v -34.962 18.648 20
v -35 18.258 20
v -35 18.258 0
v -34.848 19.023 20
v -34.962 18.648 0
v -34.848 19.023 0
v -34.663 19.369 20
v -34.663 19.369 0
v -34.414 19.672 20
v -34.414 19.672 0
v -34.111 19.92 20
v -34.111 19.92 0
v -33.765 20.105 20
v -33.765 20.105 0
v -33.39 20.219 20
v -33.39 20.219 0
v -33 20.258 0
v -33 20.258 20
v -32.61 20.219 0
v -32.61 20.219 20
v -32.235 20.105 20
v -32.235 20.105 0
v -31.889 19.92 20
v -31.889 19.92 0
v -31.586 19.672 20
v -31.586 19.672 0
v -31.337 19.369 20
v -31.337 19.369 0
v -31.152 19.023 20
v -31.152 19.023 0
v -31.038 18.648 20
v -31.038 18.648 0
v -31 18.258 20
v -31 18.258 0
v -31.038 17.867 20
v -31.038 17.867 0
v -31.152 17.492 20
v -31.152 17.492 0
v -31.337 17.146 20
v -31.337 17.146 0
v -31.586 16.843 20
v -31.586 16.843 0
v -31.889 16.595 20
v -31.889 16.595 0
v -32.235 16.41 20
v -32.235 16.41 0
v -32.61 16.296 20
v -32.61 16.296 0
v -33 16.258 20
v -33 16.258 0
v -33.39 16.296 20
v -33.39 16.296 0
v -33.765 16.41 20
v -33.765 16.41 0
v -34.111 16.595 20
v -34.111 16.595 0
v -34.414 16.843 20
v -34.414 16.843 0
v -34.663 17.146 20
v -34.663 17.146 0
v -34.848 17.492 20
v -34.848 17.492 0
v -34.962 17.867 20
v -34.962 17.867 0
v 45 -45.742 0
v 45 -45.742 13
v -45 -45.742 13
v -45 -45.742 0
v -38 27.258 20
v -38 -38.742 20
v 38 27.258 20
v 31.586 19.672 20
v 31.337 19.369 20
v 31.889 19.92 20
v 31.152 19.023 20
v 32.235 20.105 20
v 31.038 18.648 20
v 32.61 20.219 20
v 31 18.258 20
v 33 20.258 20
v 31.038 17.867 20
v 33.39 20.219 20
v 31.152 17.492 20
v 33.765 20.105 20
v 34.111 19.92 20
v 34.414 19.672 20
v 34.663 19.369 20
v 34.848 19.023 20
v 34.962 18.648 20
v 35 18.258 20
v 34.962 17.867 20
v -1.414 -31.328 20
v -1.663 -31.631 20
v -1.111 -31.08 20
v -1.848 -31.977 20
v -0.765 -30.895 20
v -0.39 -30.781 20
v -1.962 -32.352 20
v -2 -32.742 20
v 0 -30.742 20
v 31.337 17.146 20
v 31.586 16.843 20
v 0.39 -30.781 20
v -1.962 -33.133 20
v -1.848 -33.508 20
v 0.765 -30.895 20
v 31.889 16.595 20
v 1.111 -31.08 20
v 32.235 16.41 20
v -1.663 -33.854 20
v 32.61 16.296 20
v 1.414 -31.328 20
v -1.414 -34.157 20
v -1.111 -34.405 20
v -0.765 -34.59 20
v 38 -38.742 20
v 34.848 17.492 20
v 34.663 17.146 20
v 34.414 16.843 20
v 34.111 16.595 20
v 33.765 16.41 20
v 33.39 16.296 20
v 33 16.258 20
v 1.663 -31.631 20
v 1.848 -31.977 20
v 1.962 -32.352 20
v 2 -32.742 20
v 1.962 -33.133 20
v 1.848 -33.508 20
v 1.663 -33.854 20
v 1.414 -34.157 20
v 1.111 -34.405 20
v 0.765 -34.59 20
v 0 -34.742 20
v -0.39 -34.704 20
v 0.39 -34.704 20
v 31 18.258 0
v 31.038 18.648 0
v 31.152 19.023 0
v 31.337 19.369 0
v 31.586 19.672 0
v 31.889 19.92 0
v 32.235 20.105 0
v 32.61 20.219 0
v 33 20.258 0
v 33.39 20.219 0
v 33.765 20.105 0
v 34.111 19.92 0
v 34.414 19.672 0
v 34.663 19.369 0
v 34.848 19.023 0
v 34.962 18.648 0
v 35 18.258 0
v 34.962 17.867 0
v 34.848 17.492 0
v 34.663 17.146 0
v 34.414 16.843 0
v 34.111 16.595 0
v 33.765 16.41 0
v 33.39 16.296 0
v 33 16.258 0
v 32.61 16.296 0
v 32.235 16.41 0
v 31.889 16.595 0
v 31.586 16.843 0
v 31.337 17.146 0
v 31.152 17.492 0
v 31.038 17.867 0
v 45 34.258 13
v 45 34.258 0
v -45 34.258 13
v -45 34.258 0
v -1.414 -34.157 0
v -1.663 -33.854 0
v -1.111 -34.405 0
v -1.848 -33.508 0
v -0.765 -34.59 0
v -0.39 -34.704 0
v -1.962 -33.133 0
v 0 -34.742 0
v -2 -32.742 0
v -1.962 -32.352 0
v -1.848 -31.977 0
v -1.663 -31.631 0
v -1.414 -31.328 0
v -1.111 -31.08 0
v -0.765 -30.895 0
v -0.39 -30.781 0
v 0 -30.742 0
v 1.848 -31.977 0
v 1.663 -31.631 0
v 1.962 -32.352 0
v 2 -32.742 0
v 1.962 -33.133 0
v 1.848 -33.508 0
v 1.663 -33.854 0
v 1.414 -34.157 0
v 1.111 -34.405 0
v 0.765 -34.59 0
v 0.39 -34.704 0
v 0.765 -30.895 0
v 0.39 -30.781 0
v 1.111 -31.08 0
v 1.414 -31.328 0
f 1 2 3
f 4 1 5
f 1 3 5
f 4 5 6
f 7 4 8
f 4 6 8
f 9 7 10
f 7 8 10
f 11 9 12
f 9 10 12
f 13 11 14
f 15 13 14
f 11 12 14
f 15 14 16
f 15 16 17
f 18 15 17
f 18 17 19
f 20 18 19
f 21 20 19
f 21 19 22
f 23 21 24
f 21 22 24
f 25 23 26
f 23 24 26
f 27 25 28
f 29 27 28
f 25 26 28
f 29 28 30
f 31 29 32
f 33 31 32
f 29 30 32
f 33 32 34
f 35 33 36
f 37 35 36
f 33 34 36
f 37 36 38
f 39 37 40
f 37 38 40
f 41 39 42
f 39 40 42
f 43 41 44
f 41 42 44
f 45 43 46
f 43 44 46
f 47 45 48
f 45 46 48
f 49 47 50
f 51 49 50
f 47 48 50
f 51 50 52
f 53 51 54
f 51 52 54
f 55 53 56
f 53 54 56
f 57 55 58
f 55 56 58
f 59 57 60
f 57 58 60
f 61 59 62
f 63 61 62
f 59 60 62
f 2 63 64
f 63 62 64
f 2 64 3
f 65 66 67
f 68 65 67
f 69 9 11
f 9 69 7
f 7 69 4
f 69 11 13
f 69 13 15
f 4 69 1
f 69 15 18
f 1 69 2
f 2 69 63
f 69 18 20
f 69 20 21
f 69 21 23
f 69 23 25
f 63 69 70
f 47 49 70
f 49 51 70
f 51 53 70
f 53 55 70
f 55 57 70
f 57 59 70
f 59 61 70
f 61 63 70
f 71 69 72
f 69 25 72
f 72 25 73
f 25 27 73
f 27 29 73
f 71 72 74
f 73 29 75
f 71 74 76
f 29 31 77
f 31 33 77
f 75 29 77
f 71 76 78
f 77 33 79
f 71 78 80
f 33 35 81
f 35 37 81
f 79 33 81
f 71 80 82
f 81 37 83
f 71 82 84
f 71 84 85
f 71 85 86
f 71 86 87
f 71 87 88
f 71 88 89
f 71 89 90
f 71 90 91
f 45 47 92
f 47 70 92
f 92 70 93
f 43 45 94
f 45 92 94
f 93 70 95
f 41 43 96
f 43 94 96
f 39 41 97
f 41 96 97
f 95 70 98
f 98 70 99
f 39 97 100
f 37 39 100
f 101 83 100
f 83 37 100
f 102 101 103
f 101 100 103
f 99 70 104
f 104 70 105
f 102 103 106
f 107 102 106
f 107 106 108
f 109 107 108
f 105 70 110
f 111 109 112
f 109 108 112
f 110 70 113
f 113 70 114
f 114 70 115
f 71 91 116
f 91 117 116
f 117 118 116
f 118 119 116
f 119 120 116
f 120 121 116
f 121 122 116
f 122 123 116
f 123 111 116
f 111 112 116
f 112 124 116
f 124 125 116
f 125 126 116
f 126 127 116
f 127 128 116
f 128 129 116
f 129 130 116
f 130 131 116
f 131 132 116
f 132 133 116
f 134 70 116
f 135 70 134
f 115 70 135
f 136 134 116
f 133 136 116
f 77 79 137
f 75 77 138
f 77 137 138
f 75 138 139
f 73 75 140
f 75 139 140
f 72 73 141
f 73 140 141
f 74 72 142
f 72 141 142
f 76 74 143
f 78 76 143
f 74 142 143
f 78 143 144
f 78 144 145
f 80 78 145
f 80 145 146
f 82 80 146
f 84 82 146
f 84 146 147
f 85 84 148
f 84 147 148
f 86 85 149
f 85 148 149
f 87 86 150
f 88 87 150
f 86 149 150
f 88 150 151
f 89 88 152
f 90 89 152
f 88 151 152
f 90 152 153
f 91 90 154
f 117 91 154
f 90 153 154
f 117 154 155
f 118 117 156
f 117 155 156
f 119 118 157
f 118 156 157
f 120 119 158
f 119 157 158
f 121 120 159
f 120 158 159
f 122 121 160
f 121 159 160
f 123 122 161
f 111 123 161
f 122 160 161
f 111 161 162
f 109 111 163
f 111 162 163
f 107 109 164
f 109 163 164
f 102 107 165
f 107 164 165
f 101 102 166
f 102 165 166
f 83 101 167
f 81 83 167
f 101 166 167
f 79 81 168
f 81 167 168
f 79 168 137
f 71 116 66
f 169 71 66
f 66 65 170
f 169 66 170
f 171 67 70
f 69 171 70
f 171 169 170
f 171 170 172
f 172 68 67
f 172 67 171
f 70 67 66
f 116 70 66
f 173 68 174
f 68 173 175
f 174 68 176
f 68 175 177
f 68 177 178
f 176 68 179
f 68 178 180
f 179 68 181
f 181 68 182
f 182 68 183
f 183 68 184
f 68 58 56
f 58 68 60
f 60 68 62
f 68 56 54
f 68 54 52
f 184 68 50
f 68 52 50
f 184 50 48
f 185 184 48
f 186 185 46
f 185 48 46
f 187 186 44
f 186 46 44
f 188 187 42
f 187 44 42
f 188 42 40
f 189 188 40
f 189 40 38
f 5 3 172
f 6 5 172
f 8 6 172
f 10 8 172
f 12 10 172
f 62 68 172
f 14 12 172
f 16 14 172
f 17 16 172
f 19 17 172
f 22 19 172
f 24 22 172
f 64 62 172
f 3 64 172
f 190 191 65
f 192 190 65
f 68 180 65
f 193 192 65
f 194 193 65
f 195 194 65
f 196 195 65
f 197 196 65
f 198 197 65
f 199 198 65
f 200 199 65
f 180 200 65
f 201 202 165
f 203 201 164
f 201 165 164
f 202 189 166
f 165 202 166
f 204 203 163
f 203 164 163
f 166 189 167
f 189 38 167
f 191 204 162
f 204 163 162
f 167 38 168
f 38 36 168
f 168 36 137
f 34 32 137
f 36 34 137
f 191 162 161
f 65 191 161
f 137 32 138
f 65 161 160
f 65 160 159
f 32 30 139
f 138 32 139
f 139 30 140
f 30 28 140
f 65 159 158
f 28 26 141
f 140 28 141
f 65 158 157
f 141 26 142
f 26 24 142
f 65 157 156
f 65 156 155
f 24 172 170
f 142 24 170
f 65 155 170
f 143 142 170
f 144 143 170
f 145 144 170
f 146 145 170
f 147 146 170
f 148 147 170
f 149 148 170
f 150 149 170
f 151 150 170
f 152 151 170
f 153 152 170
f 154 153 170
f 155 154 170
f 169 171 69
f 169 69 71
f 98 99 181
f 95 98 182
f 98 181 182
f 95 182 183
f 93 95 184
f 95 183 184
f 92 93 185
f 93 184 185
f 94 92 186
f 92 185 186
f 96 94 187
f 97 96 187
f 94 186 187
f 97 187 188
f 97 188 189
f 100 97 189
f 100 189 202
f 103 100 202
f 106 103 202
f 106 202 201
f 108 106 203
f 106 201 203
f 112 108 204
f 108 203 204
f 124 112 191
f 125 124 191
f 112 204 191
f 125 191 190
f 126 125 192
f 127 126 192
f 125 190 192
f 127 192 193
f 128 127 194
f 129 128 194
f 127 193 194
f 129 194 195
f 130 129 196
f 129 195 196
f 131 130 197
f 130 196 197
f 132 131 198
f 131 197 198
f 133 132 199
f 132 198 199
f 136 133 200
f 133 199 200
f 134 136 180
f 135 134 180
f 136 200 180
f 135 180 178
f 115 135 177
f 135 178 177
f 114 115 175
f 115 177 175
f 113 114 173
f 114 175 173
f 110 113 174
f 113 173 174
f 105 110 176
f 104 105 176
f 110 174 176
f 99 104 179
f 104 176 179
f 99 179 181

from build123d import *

# Parameters (mm, degrees)
SKETCH5_W           = 90
SKETCH5_H           = 80
BOSS_EXTRUDE4_DEPTH = 13
BOSS_EXTRUDE5_DEPTH = 80
CHAMFER1_SIZE       = 7
SKETCH13_R          = 2
CUT_EXTRUDE4_DEPTH  = 20
SKETCH14_R          = 2
CUT_EXTRUDE8_DEPTH  = 20


with BuildPart() as part:
    # Sketch5 → Boss-Extrude4 (new body)
    with BuildSketch(Plane.XY):
        with Locations((0, -5.742449829)):
            Rectangle(SKETCH5_W, SKETCH5_H)
    extrude(amount=BOSS_EXTRUDE4_DEPTH)

    # Sketch6 → Boss-Extrude5 (add, through all)
    with BuildSketch(Plane.XZ.offset(45.742449829)):
        Polygon((-45, 13), (-38, 20), (38, 20), (45, 13), (45, 0), (-45, 0), align=None)
    extrude(amount=-BOSS_EXTRUDE5_DEPTH)

    # Chamfer1
    chamfer1_edges = [part.edges().sort_by_distance(p)[0] for p in [
        (0, -45.742449829, 20),
        (0, 34.257550171, 20),
    ]]
    chamfer(chamfer1_edges, length=CHAMFER1_SIZE)

    # Sketch13 → Cut-Extrude4 (cut)
    with BuildSketch(Plane(origin=(0, 0, 0), x_dir=(-1, 0, 0), z_dir=(0, 0, -1))):
        with Locations((0, -32.742449829)):
            Circle(SKETCH13_R)
    extrude(amount=-CUT_EXTRUDE4_DEPTH, mode=Mode.SUBTRACT)

    # Sketch14 → Cut-Extrude8 (cut)
    with BuildSketch(Plane(origin=(0, 0, 0), x_dir=(-1, 0, 0), z_dir=(0, 0, -1))):
        with Locations((-33, 18.257550171)):
            Circle(SKETCH14_R)
        with Locations((33, 18.257550171)):
            Circle(SKETCH14_R)
    extrude(amount=-CUT_EXTRUDE8_DEPTH, mode=Mode.SUBTRACT)


solid = part.part
